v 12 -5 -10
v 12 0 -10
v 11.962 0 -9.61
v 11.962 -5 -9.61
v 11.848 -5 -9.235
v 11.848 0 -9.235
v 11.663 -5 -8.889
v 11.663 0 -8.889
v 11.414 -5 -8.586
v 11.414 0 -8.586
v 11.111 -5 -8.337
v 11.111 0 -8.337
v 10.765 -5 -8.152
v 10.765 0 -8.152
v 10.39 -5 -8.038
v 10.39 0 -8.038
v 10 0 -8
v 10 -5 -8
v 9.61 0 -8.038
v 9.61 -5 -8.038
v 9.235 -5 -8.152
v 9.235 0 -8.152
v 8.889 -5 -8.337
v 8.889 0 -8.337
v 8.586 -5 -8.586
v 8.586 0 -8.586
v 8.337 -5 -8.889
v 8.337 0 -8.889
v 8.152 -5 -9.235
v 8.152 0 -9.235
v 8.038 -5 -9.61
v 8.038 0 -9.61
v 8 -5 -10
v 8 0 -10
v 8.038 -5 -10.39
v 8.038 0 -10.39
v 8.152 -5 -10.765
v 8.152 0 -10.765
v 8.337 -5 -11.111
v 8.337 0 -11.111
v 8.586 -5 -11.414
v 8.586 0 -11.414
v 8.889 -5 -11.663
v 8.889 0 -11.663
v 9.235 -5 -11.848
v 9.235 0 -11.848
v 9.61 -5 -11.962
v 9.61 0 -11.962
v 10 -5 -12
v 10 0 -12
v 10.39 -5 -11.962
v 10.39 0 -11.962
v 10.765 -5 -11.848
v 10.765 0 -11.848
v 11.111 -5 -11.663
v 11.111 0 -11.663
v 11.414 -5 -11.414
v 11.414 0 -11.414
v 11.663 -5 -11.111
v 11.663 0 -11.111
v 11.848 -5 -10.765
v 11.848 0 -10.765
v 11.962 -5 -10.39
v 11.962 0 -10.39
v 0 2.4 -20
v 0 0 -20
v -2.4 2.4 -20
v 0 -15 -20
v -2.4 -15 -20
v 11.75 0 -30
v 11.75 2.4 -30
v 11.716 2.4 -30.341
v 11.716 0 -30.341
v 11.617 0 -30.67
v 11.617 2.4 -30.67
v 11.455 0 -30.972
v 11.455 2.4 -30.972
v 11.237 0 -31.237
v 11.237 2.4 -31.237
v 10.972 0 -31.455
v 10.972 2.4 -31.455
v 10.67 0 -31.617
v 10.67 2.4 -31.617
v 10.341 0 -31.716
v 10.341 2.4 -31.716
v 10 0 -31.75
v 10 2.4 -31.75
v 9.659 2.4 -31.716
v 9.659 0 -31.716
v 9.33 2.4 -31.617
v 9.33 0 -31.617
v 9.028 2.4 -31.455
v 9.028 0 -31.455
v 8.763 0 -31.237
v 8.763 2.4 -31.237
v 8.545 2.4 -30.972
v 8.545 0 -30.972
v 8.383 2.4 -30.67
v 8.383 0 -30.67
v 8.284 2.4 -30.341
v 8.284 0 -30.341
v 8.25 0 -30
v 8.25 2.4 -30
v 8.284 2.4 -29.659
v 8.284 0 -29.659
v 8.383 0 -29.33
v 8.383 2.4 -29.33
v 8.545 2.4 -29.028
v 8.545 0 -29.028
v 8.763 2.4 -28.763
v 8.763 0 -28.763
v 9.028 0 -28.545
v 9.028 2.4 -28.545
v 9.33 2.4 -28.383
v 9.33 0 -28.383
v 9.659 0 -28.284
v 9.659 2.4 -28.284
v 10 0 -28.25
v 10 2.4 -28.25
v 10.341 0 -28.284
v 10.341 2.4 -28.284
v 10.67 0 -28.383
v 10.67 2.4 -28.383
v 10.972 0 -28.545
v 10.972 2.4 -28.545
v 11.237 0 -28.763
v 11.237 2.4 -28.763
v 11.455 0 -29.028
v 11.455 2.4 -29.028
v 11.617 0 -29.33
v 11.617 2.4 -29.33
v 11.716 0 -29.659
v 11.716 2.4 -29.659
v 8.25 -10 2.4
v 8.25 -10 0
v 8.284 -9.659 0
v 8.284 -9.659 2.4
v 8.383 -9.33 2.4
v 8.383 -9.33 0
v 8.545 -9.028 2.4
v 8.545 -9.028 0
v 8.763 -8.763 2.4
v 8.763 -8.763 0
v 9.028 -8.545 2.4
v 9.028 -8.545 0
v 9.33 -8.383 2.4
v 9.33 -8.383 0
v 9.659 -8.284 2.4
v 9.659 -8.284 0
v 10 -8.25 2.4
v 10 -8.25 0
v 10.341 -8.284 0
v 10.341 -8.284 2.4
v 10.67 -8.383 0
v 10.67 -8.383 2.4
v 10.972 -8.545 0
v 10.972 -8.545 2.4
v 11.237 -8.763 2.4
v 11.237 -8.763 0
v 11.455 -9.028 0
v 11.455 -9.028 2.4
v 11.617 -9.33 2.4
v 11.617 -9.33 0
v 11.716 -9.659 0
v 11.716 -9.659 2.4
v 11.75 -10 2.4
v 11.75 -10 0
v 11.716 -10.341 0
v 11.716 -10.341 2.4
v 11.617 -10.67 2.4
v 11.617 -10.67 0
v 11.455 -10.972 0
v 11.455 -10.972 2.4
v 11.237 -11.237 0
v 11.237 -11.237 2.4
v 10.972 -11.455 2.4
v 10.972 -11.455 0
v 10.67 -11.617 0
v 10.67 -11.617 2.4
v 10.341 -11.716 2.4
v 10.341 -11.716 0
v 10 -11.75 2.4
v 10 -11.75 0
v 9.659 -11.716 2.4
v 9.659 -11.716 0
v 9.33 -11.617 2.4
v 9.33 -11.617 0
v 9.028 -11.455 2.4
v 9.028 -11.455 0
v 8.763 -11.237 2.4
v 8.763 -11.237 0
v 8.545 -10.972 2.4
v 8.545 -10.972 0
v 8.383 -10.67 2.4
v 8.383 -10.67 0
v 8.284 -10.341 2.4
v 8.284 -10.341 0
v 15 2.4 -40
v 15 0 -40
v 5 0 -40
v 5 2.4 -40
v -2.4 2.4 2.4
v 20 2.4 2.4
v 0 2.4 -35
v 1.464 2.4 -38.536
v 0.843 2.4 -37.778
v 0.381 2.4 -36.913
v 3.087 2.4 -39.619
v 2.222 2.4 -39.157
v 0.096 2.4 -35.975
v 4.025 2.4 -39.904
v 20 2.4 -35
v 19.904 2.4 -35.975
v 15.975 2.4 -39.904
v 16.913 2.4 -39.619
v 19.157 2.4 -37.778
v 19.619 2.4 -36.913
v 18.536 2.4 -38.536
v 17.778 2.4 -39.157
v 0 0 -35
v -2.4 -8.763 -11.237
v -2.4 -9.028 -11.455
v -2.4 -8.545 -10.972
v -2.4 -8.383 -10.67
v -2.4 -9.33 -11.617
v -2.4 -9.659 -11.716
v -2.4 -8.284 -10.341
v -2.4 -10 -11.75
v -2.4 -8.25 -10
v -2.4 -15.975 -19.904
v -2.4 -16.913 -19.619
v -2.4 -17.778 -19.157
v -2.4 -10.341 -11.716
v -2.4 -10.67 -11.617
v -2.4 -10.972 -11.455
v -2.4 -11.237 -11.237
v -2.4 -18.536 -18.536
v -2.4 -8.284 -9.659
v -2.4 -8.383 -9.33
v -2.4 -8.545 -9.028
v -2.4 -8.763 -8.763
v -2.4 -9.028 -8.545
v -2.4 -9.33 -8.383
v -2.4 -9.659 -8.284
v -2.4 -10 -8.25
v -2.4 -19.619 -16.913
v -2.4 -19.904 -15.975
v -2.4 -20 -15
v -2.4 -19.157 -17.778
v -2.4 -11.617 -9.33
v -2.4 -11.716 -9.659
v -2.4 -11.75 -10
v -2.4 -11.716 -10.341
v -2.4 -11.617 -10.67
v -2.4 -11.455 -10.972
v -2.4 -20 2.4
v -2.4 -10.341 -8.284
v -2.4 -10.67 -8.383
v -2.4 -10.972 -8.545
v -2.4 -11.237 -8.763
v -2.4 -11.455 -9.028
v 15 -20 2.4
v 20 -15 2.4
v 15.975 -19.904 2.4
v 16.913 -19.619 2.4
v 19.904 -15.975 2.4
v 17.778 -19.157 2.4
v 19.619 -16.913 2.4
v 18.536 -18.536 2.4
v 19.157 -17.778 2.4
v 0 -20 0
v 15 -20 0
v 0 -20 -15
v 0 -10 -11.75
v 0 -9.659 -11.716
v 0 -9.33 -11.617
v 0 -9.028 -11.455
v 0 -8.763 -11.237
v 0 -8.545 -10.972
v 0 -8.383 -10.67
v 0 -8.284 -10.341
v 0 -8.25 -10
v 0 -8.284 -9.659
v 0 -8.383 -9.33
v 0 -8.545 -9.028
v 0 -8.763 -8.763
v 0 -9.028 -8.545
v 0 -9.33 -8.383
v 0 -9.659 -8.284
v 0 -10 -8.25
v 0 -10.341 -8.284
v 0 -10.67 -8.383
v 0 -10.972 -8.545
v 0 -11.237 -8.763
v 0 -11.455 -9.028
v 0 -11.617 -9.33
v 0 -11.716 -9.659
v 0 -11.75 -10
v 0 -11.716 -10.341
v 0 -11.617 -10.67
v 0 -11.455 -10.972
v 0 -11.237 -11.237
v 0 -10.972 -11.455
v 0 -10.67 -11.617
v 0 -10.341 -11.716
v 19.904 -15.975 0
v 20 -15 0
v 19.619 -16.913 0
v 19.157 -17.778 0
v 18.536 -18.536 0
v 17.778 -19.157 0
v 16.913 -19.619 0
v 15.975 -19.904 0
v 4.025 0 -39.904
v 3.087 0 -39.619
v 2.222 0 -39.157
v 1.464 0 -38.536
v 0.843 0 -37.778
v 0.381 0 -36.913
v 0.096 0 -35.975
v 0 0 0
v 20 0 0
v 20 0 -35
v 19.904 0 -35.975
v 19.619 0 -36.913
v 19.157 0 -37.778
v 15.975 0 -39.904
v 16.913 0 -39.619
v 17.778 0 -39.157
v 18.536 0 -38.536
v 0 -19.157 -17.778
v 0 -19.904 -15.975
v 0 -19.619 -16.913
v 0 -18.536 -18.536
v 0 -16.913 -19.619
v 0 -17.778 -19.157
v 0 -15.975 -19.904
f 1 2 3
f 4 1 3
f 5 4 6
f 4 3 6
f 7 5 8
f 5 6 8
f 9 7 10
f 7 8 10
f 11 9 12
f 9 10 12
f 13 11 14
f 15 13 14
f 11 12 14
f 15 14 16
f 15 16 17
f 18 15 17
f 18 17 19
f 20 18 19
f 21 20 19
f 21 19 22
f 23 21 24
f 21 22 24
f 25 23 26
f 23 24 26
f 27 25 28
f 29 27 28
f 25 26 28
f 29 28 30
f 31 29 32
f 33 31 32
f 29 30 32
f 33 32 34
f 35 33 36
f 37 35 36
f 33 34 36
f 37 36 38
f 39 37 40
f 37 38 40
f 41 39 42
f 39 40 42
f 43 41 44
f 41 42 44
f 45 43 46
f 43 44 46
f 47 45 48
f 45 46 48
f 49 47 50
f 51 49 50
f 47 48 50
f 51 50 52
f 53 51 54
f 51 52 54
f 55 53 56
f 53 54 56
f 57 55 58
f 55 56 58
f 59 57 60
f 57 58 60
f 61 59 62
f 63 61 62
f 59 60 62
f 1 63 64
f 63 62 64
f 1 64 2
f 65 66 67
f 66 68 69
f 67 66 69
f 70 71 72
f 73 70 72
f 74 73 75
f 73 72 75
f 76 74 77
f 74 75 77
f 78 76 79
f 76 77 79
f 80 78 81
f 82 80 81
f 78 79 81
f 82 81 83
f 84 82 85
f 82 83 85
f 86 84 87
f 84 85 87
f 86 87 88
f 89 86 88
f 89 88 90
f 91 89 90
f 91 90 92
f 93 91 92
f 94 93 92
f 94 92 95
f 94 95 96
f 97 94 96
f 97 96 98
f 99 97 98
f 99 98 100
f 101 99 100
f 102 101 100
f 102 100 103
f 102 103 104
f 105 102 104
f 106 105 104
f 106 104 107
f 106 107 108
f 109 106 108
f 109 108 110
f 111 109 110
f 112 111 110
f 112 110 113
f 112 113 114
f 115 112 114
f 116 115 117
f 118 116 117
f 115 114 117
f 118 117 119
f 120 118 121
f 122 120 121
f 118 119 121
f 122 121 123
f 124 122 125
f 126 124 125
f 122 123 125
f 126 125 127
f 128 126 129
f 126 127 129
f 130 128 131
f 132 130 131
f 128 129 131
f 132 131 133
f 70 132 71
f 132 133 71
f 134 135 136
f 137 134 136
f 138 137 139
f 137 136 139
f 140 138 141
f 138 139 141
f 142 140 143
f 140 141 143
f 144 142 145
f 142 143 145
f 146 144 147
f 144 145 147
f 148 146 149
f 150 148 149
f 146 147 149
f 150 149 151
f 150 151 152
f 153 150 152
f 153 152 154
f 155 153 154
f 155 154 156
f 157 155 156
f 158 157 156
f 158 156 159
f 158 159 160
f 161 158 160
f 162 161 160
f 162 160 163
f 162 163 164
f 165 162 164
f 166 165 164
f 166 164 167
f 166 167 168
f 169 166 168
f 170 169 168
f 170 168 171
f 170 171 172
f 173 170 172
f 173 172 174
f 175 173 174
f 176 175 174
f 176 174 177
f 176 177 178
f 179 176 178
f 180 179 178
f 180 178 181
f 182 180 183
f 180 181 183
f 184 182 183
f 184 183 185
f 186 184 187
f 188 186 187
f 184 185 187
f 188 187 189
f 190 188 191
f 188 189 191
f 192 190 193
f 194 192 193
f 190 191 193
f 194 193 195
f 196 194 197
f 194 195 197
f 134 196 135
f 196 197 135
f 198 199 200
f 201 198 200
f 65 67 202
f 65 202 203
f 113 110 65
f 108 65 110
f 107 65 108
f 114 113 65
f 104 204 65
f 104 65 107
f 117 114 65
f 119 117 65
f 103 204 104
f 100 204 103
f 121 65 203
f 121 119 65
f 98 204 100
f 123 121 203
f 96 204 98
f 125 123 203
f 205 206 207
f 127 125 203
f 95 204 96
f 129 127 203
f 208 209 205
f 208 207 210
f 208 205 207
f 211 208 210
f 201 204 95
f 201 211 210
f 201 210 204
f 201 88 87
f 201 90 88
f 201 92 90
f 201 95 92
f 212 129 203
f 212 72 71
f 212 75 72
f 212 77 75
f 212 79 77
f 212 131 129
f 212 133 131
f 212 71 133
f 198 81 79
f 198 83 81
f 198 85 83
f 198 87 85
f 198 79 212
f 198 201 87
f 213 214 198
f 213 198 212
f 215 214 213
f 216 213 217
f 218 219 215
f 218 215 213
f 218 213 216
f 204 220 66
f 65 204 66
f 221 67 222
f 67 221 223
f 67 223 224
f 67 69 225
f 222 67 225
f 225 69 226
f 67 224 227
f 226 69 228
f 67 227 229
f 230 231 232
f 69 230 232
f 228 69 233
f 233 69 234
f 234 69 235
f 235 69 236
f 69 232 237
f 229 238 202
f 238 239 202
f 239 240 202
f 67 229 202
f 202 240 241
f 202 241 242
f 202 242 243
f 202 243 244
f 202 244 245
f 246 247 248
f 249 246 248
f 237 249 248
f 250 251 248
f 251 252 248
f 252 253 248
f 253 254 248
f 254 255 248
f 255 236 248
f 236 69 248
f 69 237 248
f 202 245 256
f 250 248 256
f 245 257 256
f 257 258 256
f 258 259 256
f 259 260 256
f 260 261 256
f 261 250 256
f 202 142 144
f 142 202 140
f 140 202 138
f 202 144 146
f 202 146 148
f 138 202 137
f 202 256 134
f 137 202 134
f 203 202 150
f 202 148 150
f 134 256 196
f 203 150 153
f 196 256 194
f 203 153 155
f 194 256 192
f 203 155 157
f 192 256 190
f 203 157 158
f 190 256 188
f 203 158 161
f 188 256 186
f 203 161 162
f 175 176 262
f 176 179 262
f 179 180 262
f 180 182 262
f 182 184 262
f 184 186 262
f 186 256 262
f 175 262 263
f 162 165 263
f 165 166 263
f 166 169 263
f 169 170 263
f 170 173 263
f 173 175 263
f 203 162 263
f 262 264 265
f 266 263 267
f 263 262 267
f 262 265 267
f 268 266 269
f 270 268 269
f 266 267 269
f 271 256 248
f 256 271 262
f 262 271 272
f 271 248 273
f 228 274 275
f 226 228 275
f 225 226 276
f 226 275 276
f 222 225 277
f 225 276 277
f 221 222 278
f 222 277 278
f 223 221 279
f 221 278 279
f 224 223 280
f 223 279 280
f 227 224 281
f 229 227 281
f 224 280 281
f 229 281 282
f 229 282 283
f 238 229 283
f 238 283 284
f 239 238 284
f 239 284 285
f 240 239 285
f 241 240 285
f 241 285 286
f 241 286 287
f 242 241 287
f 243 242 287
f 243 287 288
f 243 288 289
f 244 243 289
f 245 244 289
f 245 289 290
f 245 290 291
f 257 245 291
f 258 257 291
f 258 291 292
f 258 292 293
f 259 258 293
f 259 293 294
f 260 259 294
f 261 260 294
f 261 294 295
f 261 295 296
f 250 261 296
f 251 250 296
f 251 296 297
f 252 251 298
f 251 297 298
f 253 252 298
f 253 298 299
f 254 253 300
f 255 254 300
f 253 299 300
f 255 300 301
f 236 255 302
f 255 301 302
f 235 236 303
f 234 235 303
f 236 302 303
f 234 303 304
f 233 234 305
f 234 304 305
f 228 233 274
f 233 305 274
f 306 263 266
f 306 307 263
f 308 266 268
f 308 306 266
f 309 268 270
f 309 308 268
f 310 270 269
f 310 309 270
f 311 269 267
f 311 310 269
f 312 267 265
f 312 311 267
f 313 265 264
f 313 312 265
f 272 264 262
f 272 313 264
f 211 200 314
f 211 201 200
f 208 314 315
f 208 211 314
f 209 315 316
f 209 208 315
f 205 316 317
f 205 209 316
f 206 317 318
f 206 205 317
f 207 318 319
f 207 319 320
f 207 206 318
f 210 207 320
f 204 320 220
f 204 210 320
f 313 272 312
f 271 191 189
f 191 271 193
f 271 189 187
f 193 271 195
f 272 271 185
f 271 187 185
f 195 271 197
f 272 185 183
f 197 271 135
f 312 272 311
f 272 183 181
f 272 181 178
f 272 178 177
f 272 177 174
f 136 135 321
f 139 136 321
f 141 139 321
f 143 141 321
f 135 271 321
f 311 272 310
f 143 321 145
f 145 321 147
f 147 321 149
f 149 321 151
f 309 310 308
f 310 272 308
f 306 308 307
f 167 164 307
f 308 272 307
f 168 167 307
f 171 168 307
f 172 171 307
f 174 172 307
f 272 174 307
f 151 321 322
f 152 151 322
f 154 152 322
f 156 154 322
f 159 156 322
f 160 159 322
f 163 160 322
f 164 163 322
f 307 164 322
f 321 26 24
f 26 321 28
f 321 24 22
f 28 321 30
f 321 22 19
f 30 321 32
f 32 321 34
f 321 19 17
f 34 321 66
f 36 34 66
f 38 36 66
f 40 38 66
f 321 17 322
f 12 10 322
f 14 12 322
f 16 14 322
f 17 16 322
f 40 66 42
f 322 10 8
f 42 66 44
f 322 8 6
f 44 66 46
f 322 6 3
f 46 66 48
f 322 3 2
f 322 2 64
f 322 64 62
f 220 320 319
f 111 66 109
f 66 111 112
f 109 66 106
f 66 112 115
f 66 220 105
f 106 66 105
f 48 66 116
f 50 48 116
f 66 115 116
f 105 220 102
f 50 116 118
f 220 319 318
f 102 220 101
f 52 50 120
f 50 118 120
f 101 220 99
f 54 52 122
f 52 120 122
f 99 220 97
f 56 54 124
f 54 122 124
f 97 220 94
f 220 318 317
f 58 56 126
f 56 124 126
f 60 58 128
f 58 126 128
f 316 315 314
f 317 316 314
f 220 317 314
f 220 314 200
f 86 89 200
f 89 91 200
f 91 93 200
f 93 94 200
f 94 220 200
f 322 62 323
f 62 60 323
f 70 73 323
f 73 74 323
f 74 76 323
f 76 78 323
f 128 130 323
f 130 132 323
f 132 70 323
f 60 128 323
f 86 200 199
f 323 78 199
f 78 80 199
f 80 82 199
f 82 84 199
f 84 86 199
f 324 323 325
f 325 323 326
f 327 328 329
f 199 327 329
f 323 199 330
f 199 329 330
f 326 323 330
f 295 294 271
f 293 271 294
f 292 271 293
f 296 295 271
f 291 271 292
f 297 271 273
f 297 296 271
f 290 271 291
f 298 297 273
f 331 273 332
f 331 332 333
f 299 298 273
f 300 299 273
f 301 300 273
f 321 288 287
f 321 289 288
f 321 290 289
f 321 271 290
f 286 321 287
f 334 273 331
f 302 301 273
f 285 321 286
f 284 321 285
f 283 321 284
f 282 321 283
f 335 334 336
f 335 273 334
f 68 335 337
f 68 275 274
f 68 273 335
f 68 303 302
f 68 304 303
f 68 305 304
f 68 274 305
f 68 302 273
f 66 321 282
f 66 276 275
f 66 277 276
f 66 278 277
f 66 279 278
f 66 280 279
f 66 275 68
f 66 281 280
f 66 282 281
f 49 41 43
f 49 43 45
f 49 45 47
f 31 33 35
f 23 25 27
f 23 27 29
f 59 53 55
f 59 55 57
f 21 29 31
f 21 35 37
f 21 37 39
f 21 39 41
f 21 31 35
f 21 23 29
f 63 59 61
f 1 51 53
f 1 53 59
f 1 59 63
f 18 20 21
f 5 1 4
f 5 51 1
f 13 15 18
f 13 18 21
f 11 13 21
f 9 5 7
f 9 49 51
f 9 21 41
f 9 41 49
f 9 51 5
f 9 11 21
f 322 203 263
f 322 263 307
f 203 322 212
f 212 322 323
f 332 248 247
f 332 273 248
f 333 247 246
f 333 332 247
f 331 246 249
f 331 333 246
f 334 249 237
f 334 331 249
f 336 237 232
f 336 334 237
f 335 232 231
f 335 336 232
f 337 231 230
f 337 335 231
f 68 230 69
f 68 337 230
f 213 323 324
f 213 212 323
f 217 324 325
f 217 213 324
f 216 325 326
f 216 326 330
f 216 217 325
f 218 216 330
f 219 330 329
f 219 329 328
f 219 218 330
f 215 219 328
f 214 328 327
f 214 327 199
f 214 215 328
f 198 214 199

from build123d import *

# Parameters (mm, degrees)
SKETCH1_W           = 2.4
SKETCH1_H           = 20
SKETCH1_H_2         = 2.4
SKETCH1_W_2         = 20
BOSS_EXTRUDE1_DEPTH = 20
BOSS_EXTRUDE2_DEPTH = 2.4
CUT_EXTRUDE1_REACH  = 4.4
SKETCH4_R           = 1.75
CUT_EXTRUDE2_REACH  = 4.4
SKETCH5_R           = 1.75
CUT_EXTRUDE3_REACH  = 24.4
SKETCH6_R           = 1.75
SKETCH7_R           = 2
BOSS_EXTRUDE3_DEPTH = 5
FILLET1_R           = 5


with BuildPart() as part:
    # Sketch1 → Boss-Extrude1 (new body)
    with BuildSketch(Plane(origin=(0, 0, 0), x_dir=(1, 0, 0), z_dir=(0, 1, 0))):
        with Locations((-1.2, 10)):
            Rectangle(SKETCH1_W, SKETCH1_H)
        with Locations((-1.2, -1.2)):
            Rectangle(SKETCH1_W, SKETCH1_H_2)
        with Locations((10, -1.2)):
            Rectangle(SKETCH1_W_2, SKETCH1_H_2)
    extrude(amount=-BOSS_EXTRUDE1_DEPTH)

    # Sketch2 → Boss-Extrude2 (add)
    with BuildSketch(Plane(origin=(0, 0, 0), x_dir=(1, 0, 0), z_dir=(0, 1, 0))):
        Polygon((20, -2.4), (20, 40), (0, 40), (0, 20), (-2.4, 20), (-2.4, -2.4), align=None)
    extrude(amount=BOSS_EXTRUDE2_DEPTH)

    # Sketch4 → Cut-Extrude1 (cut, up to next)
    with BuildSketch(Plane(origin=(0, 0, 0), x_dir=(0, 0, -1), z_dir=(1, 0, 0)), mode=Mode.PRIVATE) as cut_extrude1_sk1:
        with Locations((10, -10)):
            Circle(SKETCH4_R)
    cut_extrude1_tool1 = extrude(cut_extrude1_sk1.sketch, amount=-CUT_EXTRUDE1_REACH, mode=Mode.PRIVATE) & part.part
    add(cut_extrude1_tool1.solids().sort_by_distance((0, -10, -10))[0], mode=Mode.SUBTRACT)

    # Sketch5 → Cut-Extrude2 (cut, up to next)
    with BuildSketch(Plane(origin=(0, 0, 0), x_dir=(-1, 0, 0), z_dir=(0, 0, -1)), mode=Mode.PRIVATE) as cut_extrude2_sk1:
        with Locations((-10, -10)):
            Circle(SKETCH5_R)
    cut_extrude2_tool1 = extrude(cut_extrude2_sk1.sketch, amount=-CUT_EXTRUDE2_REACH, mode=Mode.PRIVATE) & part.part
    add(cut_extrude2_tool1.solids().sort_by_distance((10, -10, 0))[0], mode=Mode.SUBTRACT)

    # Sketch6 → Cut-Extrude3 (cut, up to next)
    with BuildSketch(Plane(origin=(0, 2.4, 0), x_dir=(1, 0, 0), z_dir=(0, 1, 0)), mode=Mode.PRIVATE) as cut_extrude3_sk1:
        with Locations((10, 30)):
            Circle(SKETCH6_R)
    cut_extrude3_tool1 = extrude(cut_extrude3_sk1.sketch, amount=-CUT_EXTRUDE3_REACH, mode=Mode.PRIVATE) & part.part
    add(cut_extrude3_tool1.solids().sort_by_distance((10, 2.4, -30))[0], mode=Mode.SUBTRACT)

    # Sketch7 → Boss-Extrude3 (add)
    with BuildSketch(Plane.XZ):
        with Locations((10, -10)):
            Circle(SKETCH7_R)
    extrude(amount=BOSS_EXTRUDE3_DEPTH)

    # Fillet1
    fillet1_edges = [part.edges().sort_by_distance(p)[0] for p in [
        (20, -20, 1.2),
        (20, 1.2, -40),
        (0, 1.2, -40),
        (-1.2, -20, -20),
    ]]
    fillet(fillet1_edges, radius=FILLET1_R)


solid = part.part
